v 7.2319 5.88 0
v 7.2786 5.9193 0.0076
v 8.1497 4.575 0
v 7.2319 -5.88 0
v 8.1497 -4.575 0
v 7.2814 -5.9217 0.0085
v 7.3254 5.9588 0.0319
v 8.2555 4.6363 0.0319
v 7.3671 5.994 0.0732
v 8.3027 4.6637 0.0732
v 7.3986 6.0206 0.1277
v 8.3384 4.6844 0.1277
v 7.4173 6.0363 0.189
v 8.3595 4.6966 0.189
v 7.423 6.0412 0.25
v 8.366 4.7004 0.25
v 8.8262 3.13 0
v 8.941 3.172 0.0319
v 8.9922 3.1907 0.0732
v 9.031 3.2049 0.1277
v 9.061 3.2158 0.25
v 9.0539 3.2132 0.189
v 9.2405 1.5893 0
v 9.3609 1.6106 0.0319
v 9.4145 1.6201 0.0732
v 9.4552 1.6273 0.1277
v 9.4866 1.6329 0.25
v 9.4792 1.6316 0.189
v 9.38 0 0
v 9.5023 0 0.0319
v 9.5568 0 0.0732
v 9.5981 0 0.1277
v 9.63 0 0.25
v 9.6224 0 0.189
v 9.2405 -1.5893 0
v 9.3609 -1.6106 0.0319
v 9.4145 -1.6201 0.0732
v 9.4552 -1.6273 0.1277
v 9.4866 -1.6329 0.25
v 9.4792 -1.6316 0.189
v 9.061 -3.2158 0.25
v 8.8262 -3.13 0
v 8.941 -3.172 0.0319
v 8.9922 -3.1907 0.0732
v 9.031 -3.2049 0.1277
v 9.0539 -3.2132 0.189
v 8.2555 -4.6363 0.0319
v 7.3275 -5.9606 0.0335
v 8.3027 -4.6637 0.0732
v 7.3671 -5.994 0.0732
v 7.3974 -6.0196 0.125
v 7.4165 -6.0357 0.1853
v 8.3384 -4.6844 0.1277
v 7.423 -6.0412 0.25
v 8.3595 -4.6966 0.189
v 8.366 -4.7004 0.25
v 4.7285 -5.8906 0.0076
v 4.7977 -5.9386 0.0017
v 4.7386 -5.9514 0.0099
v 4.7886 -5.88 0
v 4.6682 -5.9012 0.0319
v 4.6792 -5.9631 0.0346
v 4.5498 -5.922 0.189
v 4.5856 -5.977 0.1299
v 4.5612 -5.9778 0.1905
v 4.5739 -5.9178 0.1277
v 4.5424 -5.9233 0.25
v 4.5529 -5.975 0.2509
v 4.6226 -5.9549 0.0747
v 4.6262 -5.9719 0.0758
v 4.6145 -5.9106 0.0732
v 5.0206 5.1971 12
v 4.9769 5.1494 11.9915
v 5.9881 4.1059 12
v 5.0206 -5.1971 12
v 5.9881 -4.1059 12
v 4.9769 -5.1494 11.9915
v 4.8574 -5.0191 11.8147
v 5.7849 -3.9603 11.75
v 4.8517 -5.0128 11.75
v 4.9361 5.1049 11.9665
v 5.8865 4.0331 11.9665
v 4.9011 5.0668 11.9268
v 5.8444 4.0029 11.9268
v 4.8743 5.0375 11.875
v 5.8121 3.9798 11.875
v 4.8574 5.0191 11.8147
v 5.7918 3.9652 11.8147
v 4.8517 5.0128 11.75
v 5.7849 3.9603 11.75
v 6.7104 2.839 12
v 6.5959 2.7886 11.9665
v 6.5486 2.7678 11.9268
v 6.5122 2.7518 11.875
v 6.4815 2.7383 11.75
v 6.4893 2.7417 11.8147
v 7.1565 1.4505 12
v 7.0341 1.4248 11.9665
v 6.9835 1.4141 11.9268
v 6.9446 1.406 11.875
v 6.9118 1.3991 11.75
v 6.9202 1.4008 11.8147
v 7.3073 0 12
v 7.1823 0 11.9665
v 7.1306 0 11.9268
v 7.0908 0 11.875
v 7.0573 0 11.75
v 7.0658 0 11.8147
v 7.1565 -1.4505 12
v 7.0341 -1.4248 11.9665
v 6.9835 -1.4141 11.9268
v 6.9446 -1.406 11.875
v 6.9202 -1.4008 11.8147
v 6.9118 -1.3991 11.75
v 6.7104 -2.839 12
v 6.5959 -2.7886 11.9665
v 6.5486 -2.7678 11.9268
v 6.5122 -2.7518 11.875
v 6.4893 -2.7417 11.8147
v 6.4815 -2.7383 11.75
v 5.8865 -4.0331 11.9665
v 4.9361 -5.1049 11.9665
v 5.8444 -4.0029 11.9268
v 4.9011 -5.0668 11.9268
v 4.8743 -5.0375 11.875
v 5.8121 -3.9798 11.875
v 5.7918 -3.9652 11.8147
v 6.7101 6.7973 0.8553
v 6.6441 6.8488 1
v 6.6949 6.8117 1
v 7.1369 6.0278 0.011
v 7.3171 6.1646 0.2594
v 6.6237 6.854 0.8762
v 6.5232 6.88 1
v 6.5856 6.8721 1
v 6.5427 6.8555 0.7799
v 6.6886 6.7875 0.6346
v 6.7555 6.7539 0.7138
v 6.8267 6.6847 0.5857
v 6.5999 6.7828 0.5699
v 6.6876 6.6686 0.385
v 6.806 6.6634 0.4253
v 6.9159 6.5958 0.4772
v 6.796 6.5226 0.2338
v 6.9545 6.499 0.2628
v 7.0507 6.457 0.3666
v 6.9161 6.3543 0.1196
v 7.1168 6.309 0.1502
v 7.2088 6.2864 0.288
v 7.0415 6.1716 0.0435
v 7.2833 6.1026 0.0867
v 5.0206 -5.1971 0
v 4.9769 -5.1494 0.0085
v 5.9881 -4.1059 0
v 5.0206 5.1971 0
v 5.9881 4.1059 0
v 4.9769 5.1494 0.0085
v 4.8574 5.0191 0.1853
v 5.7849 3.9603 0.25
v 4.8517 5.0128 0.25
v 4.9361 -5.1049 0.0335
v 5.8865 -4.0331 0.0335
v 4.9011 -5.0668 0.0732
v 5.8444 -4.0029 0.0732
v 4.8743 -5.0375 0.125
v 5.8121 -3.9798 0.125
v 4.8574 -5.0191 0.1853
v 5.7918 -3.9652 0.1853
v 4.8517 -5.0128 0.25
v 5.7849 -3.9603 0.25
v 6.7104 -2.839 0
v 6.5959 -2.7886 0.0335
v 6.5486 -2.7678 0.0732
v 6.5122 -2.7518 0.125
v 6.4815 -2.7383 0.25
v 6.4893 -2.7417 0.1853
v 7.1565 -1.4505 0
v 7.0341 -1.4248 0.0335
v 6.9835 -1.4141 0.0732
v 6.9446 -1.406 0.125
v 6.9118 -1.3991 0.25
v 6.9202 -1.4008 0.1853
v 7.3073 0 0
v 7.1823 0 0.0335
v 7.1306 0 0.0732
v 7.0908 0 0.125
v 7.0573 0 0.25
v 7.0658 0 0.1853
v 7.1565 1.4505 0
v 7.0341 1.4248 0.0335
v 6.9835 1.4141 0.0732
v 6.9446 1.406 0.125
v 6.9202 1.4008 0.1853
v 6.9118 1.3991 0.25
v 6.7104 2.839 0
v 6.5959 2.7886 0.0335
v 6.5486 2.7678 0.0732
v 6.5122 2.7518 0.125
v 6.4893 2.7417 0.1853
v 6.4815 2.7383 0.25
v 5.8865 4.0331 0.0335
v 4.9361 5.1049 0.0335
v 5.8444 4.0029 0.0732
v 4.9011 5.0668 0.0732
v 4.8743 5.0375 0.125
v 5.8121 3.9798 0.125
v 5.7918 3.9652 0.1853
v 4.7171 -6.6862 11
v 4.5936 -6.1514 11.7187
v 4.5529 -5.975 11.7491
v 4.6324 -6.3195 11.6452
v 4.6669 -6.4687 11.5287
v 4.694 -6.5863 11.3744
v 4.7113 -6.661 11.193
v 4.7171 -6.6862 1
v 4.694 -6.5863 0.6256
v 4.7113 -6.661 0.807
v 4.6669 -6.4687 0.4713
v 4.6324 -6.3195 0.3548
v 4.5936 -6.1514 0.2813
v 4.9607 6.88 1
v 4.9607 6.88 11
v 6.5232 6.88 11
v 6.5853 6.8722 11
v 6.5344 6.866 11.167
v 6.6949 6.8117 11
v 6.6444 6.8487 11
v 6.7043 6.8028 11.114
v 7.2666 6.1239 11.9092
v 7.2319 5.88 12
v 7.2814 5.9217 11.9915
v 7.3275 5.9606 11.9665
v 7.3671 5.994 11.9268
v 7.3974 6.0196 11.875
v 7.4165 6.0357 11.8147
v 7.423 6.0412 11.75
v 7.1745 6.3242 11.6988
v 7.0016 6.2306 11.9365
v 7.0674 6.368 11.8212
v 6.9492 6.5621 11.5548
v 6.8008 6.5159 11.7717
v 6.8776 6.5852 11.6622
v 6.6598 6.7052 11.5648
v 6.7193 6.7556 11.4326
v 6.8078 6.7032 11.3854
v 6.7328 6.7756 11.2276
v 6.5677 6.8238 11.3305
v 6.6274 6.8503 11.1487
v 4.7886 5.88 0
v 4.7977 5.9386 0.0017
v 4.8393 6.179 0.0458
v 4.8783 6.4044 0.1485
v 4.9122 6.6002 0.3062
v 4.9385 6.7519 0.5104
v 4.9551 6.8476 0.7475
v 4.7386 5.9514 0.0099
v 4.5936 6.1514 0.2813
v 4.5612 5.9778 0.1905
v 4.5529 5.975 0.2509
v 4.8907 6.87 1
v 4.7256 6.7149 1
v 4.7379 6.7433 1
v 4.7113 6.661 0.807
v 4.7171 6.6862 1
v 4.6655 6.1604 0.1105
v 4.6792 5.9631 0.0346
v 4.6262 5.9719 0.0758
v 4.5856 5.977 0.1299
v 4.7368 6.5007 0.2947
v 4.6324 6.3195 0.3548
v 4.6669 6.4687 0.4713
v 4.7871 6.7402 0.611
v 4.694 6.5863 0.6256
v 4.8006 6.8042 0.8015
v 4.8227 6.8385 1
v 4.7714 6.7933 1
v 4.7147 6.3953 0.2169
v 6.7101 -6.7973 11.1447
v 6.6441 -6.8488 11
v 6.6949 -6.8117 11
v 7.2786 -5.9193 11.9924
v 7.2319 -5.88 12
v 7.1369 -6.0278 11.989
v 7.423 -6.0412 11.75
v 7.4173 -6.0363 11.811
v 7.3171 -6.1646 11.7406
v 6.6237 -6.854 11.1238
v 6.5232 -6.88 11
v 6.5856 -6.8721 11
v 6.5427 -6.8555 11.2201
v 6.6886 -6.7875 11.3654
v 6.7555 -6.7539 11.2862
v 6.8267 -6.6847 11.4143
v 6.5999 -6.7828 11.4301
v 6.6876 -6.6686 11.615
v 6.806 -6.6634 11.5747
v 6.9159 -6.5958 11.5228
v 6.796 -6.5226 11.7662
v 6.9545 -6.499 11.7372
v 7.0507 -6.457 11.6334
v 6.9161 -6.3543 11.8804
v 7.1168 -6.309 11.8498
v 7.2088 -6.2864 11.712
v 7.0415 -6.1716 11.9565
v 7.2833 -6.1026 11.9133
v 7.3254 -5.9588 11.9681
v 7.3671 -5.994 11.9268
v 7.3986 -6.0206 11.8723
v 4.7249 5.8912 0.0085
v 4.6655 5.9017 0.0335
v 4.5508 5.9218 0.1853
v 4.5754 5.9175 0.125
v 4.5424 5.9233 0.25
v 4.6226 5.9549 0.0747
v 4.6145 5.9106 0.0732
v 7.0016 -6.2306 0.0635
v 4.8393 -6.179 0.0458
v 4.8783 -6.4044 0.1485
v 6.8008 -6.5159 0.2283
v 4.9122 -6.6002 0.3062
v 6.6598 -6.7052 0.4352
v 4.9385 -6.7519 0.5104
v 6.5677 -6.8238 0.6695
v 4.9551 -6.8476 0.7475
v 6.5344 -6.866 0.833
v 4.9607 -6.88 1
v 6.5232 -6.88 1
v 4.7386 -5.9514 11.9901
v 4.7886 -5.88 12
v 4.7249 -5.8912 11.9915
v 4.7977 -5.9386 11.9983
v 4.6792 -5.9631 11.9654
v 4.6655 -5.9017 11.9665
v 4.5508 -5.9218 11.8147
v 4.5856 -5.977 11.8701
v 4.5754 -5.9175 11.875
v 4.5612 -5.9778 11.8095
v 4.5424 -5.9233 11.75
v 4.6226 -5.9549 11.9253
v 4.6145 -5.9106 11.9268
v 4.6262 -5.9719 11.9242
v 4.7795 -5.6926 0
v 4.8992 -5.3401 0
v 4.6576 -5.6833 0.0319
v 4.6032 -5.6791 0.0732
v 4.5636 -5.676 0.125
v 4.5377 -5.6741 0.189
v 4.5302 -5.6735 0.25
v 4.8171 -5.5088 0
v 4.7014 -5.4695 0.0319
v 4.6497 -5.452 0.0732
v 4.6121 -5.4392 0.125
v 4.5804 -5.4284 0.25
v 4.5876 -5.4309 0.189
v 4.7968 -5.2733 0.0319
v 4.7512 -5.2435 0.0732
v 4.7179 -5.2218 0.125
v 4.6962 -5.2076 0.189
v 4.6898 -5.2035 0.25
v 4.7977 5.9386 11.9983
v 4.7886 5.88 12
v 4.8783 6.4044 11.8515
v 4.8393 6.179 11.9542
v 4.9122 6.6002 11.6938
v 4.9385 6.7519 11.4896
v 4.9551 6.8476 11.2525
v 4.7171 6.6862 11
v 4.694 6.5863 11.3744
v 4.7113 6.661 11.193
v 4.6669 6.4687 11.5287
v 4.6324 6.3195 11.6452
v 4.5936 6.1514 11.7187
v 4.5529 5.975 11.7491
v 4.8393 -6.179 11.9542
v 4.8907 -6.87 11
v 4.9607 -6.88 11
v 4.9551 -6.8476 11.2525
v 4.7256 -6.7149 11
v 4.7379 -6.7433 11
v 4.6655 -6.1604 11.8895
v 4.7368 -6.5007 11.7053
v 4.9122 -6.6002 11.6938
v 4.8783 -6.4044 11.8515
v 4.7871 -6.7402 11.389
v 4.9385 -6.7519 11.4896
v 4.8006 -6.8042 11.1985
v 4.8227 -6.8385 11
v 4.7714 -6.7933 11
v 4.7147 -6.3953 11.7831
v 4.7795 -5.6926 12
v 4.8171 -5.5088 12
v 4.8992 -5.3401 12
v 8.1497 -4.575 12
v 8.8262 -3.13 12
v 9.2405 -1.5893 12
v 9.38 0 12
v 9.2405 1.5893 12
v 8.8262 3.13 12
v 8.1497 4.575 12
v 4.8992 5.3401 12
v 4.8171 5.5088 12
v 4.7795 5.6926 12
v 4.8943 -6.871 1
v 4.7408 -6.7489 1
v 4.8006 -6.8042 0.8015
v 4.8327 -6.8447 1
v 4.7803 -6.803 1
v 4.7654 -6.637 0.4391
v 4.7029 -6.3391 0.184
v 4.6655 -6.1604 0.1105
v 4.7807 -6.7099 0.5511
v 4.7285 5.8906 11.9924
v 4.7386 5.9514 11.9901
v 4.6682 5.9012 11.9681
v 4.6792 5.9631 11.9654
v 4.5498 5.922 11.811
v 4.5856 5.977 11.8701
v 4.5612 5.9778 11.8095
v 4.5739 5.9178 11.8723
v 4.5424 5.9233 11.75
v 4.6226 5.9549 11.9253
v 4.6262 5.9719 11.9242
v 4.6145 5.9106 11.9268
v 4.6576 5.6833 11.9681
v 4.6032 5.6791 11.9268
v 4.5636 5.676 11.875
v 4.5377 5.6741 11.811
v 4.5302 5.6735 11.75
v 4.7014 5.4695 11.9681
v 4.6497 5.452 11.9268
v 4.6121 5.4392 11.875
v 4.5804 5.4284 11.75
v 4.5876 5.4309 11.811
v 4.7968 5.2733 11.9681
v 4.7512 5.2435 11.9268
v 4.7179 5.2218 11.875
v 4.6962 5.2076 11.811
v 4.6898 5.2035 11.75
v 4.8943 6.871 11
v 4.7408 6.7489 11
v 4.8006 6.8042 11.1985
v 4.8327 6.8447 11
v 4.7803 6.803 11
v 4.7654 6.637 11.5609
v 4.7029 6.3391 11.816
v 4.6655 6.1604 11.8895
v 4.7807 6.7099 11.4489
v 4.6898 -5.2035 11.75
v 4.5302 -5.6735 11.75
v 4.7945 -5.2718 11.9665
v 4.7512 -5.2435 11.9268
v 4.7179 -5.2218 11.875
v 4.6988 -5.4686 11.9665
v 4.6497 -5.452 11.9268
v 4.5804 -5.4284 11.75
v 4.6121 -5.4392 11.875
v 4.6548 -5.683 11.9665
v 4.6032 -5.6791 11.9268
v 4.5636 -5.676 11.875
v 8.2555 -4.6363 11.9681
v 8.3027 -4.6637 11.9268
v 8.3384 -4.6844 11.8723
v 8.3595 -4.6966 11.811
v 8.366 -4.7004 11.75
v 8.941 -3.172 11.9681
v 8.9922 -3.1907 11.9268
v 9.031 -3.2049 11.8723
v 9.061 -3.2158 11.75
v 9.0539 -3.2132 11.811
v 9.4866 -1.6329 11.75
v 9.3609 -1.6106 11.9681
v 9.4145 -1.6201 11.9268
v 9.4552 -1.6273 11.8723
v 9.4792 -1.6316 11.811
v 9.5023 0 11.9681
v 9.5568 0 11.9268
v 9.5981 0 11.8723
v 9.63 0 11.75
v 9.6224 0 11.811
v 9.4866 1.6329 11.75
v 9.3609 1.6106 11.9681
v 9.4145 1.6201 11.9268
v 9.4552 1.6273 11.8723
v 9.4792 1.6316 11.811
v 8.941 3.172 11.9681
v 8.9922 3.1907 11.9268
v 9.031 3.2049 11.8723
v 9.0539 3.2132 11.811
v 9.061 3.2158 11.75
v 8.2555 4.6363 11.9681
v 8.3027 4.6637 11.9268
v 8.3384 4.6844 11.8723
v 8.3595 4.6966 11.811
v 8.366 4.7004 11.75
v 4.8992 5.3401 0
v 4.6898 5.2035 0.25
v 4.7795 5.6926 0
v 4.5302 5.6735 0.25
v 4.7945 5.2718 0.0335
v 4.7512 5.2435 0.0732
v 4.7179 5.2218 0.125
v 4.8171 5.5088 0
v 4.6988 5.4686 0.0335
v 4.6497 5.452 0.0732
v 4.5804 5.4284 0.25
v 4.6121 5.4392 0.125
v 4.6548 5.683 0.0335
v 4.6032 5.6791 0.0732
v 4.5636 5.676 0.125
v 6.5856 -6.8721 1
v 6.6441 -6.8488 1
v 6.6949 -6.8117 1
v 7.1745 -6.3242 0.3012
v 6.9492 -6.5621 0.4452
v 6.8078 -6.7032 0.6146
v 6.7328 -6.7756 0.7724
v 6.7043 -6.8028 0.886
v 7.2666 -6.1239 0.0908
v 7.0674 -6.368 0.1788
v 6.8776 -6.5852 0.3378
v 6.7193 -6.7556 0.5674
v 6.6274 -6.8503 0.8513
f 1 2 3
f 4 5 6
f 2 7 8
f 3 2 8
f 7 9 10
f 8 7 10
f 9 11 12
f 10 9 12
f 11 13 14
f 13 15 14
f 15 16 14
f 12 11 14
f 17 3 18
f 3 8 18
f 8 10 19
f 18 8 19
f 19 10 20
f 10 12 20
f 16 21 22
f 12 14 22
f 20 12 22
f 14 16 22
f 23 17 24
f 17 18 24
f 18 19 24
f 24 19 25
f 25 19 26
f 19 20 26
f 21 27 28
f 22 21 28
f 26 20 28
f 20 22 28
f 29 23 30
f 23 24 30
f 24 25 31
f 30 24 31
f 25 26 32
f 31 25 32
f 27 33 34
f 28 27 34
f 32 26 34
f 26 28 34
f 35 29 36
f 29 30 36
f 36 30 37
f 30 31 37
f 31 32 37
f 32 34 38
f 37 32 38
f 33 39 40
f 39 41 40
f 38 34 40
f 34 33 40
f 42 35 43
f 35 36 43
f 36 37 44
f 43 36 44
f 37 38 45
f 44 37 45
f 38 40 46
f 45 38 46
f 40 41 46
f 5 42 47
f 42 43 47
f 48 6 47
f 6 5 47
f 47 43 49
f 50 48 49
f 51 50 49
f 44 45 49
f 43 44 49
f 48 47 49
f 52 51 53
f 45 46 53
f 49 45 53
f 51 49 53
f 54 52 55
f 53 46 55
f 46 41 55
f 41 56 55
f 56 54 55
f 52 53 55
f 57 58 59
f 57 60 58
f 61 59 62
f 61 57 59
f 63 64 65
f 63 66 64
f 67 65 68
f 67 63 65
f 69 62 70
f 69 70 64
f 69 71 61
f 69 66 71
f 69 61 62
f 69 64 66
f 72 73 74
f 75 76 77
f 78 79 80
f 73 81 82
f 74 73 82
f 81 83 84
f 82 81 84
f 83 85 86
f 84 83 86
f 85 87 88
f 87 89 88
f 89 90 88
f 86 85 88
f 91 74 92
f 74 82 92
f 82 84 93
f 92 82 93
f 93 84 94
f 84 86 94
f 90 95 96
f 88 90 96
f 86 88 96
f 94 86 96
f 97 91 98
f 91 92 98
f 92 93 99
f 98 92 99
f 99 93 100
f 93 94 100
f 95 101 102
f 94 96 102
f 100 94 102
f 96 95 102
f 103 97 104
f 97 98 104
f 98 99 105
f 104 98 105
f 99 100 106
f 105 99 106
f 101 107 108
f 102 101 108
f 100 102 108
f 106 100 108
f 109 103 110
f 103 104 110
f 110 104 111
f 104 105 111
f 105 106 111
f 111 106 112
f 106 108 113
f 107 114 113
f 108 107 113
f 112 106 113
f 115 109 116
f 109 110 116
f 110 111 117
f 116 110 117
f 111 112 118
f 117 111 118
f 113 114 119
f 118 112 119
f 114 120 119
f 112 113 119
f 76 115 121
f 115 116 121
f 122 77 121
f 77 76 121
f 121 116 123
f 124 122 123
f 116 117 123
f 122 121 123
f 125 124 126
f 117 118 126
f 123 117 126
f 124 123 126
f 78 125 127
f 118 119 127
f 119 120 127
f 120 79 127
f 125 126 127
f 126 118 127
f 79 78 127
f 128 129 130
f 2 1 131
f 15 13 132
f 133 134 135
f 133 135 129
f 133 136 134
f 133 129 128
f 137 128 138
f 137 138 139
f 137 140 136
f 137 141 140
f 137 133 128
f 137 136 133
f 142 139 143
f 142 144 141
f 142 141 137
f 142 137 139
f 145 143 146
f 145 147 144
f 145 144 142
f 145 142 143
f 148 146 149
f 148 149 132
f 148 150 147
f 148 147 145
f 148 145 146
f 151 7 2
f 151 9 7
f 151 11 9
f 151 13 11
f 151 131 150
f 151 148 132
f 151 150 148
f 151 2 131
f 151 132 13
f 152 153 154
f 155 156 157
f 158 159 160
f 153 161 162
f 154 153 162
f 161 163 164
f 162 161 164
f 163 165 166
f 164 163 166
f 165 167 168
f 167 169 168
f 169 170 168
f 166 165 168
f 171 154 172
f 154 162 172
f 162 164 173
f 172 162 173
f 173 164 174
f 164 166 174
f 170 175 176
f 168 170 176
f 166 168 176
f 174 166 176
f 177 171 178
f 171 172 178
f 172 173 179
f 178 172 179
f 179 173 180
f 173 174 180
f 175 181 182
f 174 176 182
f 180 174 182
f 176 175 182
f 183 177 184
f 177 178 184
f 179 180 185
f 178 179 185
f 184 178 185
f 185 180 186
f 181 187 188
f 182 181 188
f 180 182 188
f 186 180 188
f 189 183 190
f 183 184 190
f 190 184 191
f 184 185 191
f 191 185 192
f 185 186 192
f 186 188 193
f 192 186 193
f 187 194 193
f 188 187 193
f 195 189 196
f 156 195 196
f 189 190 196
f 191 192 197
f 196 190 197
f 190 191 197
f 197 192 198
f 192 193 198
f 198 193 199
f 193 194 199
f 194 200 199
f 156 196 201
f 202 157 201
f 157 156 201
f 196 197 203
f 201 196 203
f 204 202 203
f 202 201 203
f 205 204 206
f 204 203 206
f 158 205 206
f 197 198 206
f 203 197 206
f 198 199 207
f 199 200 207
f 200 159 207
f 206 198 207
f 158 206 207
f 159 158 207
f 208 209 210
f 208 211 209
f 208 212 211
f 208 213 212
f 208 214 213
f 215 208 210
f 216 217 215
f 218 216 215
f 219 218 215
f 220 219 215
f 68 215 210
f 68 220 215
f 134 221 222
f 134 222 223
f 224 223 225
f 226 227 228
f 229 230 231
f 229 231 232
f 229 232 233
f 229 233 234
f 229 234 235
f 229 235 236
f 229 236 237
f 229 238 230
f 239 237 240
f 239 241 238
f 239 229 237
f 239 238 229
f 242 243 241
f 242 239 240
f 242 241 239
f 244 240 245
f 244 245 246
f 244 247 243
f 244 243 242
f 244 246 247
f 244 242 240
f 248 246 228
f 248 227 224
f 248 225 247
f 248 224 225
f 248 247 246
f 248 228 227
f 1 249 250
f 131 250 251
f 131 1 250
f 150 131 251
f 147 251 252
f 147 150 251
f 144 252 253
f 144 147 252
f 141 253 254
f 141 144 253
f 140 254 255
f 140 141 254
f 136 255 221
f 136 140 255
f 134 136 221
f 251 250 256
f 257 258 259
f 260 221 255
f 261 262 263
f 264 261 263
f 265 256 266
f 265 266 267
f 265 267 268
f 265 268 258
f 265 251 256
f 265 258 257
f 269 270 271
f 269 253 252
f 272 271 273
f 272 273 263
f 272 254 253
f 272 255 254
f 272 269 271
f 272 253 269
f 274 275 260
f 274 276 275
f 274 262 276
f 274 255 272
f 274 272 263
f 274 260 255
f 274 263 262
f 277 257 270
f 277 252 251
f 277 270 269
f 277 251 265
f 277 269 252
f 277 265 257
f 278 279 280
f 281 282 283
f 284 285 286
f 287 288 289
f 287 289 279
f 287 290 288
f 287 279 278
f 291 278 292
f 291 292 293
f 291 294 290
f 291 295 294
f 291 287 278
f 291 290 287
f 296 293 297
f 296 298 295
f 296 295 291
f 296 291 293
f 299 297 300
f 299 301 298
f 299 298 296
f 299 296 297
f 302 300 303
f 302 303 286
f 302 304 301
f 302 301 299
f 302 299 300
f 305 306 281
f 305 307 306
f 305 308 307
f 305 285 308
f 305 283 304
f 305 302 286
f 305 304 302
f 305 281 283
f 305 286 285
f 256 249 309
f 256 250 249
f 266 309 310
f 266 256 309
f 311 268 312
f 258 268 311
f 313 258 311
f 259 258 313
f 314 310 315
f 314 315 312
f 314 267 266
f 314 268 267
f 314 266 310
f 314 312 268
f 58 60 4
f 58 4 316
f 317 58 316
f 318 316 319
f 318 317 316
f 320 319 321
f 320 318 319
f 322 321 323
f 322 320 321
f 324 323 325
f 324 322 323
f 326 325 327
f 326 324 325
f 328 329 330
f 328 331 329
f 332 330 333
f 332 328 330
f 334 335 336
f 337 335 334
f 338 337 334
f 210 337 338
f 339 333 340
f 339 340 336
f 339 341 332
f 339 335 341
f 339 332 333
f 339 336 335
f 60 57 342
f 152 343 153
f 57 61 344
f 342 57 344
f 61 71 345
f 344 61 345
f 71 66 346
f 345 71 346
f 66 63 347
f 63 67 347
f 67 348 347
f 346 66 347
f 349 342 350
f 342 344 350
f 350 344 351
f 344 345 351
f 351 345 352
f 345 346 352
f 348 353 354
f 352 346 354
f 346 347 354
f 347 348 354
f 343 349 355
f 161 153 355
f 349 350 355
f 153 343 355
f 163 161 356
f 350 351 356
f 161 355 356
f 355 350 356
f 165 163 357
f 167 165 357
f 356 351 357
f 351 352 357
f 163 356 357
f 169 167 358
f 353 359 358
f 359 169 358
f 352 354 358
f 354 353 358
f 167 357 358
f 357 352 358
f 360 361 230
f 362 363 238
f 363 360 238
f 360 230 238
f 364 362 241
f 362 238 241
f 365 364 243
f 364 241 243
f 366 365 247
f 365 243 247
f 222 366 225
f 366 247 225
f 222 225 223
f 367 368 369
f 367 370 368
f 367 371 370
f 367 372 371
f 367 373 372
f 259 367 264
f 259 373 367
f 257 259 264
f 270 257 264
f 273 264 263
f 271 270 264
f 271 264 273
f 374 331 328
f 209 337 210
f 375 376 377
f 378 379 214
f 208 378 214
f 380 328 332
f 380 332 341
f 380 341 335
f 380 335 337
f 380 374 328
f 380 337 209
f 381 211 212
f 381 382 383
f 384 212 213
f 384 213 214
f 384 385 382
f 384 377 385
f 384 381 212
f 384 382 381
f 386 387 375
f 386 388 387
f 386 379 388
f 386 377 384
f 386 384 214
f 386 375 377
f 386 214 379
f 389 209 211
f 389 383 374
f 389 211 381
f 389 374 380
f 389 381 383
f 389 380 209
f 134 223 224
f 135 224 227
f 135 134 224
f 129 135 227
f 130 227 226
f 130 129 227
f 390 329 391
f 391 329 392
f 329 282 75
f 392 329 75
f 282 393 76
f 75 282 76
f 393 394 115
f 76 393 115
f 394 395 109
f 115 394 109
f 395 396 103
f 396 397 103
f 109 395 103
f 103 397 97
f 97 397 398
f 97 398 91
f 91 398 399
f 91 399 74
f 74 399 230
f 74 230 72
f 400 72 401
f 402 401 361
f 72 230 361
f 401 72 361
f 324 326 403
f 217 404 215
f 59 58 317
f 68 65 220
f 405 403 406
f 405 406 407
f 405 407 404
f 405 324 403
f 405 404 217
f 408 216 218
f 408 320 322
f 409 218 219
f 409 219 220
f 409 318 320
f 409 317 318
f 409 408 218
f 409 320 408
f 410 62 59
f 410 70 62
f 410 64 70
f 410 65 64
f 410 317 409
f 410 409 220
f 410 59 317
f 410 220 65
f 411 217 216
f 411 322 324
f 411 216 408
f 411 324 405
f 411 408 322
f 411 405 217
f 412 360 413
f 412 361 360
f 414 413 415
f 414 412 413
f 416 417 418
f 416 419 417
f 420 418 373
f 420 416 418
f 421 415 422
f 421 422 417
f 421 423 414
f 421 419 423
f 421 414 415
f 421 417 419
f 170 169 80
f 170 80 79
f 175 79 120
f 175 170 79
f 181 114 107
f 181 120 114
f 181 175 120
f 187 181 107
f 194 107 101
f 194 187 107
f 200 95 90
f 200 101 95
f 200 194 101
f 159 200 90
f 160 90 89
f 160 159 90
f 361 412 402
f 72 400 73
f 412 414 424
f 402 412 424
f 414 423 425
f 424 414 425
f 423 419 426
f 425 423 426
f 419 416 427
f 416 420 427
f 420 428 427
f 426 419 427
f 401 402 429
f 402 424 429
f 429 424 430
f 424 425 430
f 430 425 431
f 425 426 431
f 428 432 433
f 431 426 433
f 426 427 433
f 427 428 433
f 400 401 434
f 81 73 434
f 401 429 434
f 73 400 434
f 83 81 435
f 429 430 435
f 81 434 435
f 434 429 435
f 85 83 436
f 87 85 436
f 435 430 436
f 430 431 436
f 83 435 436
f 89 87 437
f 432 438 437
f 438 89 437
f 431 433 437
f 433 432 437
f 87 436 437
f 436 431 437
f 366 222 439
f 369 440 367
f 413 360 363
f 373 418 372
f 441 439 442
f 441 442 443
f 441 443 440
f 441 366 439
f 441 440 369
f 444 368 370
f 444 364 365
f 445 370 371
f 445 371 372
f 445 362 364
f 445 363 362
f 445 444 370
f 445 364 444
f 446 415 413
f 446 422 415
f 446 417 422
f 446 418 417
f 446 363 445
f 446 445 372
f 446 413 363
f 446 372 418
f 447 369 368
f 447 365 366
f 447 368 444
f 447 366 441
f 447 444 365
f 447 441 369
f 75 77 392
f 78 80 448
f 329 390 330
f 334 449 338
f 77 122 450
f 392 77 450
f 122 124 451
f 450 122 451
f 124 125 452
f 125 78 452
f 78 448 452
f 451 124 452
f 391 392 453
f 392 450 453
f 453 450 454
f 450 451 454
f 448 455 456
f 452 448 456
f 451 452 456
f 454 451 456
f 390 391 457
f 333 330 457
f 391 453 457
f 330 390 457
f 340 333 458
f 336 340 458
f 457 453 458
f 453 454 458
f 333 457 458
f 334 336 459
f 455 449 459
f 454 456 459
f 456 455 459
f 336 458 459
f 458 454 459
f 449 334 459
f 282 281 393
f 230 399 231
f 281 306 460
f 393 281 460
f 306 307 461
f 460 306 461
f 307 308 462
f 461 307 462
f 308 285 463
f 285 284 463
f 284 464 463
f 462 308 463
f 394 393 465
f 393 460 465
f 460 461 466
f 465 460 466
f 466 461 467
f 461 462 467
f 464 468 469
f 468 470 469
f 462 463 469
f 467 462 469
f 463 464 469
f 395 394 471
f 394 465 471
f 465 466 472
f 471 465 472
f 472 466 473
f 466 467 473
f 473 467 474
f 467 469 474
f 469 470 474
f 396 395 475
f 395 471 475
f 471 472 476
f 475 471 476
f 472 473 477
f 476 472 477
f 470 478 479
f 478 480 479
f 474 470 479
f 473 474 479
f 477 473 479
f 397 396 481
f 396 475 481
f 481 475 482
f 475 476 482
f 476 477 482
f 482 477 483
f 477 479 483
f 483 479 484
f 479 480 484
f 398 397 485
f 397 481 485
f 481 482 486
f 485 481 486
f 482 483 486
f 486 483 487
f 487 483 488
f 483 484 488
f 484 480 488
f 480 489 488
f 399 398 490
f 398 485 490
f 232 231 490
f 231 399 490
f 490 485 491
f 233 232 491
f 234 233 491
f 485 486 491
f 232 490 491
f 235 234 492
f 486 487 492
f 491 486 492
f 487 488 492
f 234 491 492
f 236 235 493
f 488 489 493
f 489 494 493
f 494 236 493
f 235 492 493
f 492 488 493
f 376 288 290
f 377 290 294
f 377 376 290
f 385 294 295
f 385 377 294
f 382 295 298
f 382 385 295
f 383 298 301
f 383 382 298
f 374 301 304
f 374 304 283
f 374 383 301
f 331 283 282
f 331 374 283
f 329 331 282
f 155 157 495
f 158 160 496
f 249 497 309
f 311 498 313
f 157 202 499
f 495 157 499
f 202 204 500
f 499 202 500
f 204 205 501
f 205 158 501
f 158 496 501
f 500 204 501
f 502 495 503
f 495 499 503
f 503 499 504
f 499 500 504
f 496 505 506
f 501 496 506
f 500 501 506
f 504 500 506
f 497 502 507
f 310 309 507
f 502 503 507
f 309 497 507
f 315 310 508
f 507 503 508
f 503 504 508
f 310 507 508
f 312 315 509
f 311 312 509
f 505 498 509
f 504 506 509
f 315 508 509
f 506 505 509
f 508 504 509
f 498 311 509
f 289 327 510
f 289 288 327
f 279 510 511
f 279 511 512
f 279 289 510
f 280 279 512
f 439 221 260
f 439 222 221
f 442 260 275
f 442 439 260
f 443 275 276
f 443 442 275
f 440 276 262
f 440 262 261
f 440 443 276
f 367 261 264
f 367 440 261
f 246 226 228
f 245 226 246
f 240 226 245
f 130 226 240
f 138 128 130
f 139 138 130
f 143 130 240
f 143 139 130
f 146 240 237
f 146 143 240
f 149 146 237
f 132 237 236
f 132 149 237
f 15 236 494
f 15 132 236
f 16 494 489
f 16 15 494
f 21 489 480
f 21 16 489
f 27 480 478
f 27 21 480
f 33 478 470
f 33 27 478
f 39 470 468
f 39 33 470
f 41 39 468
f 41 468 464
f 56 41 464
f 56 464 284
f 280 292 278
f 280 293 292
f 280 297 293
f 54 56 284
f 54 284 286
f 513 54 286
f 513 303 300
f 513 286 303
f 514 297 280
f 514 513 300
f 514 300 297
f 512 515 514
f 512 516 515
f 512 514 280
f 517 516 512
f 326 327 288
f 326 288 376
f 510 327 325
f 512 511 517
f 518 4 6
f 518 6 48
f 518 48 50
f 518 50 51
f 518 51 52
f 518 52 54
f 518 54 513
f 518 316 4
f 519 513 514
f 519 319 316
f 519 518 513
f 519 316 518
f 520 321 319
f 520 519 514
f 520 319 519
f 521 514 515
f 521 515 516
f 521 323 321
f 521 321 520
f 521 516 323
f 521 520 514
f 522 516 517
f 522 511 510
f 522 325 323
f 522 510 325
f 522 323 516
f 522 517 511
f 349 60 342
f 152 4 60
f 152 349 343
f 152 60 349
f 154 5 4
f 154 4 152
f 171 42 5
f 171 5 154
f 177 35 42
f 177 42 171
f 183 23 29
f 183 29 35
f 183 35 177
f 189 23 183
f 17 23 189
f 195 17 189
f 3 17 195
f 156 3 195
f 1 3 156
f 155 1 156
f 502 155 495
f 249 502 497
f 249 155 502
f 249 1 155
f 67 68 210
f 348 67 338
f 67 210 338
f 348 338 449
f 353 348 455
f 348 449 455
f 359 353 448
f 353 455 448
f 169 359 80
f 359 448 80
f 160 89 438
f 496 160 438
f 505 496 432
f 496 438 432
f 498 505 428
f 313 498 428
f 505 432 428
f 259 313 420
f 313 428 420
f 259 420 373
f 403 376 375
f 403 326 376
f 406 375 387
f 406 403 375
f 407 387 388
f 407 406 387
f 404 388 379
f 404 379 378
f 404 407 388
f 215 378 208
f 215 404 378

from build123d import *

# Parameters (mm, degrees)
BOSS_EXTRUDE1_DEPTH = 12
FILLET1_R           = 1
FILLET2_R           = 1
FILLET3_R           = 0.25


with BuildPart() as part:
    # Sketch1 → Boss-Extrude1 (new body)
    with BuildSketch(Plane.XY):
        with BuildLine():
            Line((6.621843031, -6.88), (4.761843031, -6.88))
            Line((4.761843031, -6.88), (4.415540745, -5.38))
            ThreePointArc((4.415540745, -5.38), (7.057327169, 0), (4.415540745, 5.38))
            Line((4.415540745, 5.38), (4.761843031, 6.88))
            Line((4.761843031, 6.88), (6.621843031, 6.88))
            ThreePointArc((6.621843031, 6.88), (9.63, 0), (6.621843031, -6.88))
        make_face()
    extrude(amount=BOSS_EXTRUDE1_DEPTH)

    # Fillet1
    fillet1_edges = [part.edges().sort_by_distance(p)[0] for p in [
        (4.415540745, -5.38, 6),
        (4.415540745, 5.38, 6),
    ]]
    fillet(fillet1_edges, radius=FILLET1_R)

    # Fillet2
    fillet2_edges = [part.edges().sort_by_distance(p)[0] for p in [
        (5.691843031, -6.88, 0),
        (5.691843031, -6.88, 12),
        (5.691843031, 6.88, 0),
        (5.691843031, 6.88, 12),
    ]]
    fillet(fillet2_edges, radius=FILLET2_R)

    # Fillet3
    fillet3_edges = [part.edges().sort_by_distance(p)[0] for p in [
        (7.057327169, 0, 0),
        (4.587679935, 5.407756591, 0),
        (7.057327169, 0, 12),
        (4.587679935, -5.407756591, 12),
        (6.621843031, -6.88, 6),
        (4.761843031, -6.88, 6),
        (9.63, 0, 0),
        (6.621843031, 6.88, 6),
        (9.63, 0, 12),
        (6.96895036, 6.541881603, 11.749608404),
        (6.96895036, 6.541881603, 0.250391596),
        (6.968950362, -6.541881601, 11.749608406),
        (6.968950361, -6.541881601, 0.250391595),
        (4.587679935, -5.407756591, 0),
        (4.543193477, -5.927755229, 11.998859068),
        (4.543193477, -5.927755229, 0.001140932),
        (4.700888568, -6.615977213, 11.677006308),
        (4.700888568, -6.615977213, 0.322993692),
        (4.587679935, 5.407756591, 12),
        (4.761843031, 6.88, 6),
        (4.700888568, 6.615977213, 11.677006308),
        (4.700888568, 6.615977213, 0.322993692),
        (4.543193495, 5.927755224, 11.998859044),
        (4.543193495, 5.927755224, 0.001140956),
    ]]
    fillet(fillet3_edges, radius=FILLET3_R)


solid = part.part
